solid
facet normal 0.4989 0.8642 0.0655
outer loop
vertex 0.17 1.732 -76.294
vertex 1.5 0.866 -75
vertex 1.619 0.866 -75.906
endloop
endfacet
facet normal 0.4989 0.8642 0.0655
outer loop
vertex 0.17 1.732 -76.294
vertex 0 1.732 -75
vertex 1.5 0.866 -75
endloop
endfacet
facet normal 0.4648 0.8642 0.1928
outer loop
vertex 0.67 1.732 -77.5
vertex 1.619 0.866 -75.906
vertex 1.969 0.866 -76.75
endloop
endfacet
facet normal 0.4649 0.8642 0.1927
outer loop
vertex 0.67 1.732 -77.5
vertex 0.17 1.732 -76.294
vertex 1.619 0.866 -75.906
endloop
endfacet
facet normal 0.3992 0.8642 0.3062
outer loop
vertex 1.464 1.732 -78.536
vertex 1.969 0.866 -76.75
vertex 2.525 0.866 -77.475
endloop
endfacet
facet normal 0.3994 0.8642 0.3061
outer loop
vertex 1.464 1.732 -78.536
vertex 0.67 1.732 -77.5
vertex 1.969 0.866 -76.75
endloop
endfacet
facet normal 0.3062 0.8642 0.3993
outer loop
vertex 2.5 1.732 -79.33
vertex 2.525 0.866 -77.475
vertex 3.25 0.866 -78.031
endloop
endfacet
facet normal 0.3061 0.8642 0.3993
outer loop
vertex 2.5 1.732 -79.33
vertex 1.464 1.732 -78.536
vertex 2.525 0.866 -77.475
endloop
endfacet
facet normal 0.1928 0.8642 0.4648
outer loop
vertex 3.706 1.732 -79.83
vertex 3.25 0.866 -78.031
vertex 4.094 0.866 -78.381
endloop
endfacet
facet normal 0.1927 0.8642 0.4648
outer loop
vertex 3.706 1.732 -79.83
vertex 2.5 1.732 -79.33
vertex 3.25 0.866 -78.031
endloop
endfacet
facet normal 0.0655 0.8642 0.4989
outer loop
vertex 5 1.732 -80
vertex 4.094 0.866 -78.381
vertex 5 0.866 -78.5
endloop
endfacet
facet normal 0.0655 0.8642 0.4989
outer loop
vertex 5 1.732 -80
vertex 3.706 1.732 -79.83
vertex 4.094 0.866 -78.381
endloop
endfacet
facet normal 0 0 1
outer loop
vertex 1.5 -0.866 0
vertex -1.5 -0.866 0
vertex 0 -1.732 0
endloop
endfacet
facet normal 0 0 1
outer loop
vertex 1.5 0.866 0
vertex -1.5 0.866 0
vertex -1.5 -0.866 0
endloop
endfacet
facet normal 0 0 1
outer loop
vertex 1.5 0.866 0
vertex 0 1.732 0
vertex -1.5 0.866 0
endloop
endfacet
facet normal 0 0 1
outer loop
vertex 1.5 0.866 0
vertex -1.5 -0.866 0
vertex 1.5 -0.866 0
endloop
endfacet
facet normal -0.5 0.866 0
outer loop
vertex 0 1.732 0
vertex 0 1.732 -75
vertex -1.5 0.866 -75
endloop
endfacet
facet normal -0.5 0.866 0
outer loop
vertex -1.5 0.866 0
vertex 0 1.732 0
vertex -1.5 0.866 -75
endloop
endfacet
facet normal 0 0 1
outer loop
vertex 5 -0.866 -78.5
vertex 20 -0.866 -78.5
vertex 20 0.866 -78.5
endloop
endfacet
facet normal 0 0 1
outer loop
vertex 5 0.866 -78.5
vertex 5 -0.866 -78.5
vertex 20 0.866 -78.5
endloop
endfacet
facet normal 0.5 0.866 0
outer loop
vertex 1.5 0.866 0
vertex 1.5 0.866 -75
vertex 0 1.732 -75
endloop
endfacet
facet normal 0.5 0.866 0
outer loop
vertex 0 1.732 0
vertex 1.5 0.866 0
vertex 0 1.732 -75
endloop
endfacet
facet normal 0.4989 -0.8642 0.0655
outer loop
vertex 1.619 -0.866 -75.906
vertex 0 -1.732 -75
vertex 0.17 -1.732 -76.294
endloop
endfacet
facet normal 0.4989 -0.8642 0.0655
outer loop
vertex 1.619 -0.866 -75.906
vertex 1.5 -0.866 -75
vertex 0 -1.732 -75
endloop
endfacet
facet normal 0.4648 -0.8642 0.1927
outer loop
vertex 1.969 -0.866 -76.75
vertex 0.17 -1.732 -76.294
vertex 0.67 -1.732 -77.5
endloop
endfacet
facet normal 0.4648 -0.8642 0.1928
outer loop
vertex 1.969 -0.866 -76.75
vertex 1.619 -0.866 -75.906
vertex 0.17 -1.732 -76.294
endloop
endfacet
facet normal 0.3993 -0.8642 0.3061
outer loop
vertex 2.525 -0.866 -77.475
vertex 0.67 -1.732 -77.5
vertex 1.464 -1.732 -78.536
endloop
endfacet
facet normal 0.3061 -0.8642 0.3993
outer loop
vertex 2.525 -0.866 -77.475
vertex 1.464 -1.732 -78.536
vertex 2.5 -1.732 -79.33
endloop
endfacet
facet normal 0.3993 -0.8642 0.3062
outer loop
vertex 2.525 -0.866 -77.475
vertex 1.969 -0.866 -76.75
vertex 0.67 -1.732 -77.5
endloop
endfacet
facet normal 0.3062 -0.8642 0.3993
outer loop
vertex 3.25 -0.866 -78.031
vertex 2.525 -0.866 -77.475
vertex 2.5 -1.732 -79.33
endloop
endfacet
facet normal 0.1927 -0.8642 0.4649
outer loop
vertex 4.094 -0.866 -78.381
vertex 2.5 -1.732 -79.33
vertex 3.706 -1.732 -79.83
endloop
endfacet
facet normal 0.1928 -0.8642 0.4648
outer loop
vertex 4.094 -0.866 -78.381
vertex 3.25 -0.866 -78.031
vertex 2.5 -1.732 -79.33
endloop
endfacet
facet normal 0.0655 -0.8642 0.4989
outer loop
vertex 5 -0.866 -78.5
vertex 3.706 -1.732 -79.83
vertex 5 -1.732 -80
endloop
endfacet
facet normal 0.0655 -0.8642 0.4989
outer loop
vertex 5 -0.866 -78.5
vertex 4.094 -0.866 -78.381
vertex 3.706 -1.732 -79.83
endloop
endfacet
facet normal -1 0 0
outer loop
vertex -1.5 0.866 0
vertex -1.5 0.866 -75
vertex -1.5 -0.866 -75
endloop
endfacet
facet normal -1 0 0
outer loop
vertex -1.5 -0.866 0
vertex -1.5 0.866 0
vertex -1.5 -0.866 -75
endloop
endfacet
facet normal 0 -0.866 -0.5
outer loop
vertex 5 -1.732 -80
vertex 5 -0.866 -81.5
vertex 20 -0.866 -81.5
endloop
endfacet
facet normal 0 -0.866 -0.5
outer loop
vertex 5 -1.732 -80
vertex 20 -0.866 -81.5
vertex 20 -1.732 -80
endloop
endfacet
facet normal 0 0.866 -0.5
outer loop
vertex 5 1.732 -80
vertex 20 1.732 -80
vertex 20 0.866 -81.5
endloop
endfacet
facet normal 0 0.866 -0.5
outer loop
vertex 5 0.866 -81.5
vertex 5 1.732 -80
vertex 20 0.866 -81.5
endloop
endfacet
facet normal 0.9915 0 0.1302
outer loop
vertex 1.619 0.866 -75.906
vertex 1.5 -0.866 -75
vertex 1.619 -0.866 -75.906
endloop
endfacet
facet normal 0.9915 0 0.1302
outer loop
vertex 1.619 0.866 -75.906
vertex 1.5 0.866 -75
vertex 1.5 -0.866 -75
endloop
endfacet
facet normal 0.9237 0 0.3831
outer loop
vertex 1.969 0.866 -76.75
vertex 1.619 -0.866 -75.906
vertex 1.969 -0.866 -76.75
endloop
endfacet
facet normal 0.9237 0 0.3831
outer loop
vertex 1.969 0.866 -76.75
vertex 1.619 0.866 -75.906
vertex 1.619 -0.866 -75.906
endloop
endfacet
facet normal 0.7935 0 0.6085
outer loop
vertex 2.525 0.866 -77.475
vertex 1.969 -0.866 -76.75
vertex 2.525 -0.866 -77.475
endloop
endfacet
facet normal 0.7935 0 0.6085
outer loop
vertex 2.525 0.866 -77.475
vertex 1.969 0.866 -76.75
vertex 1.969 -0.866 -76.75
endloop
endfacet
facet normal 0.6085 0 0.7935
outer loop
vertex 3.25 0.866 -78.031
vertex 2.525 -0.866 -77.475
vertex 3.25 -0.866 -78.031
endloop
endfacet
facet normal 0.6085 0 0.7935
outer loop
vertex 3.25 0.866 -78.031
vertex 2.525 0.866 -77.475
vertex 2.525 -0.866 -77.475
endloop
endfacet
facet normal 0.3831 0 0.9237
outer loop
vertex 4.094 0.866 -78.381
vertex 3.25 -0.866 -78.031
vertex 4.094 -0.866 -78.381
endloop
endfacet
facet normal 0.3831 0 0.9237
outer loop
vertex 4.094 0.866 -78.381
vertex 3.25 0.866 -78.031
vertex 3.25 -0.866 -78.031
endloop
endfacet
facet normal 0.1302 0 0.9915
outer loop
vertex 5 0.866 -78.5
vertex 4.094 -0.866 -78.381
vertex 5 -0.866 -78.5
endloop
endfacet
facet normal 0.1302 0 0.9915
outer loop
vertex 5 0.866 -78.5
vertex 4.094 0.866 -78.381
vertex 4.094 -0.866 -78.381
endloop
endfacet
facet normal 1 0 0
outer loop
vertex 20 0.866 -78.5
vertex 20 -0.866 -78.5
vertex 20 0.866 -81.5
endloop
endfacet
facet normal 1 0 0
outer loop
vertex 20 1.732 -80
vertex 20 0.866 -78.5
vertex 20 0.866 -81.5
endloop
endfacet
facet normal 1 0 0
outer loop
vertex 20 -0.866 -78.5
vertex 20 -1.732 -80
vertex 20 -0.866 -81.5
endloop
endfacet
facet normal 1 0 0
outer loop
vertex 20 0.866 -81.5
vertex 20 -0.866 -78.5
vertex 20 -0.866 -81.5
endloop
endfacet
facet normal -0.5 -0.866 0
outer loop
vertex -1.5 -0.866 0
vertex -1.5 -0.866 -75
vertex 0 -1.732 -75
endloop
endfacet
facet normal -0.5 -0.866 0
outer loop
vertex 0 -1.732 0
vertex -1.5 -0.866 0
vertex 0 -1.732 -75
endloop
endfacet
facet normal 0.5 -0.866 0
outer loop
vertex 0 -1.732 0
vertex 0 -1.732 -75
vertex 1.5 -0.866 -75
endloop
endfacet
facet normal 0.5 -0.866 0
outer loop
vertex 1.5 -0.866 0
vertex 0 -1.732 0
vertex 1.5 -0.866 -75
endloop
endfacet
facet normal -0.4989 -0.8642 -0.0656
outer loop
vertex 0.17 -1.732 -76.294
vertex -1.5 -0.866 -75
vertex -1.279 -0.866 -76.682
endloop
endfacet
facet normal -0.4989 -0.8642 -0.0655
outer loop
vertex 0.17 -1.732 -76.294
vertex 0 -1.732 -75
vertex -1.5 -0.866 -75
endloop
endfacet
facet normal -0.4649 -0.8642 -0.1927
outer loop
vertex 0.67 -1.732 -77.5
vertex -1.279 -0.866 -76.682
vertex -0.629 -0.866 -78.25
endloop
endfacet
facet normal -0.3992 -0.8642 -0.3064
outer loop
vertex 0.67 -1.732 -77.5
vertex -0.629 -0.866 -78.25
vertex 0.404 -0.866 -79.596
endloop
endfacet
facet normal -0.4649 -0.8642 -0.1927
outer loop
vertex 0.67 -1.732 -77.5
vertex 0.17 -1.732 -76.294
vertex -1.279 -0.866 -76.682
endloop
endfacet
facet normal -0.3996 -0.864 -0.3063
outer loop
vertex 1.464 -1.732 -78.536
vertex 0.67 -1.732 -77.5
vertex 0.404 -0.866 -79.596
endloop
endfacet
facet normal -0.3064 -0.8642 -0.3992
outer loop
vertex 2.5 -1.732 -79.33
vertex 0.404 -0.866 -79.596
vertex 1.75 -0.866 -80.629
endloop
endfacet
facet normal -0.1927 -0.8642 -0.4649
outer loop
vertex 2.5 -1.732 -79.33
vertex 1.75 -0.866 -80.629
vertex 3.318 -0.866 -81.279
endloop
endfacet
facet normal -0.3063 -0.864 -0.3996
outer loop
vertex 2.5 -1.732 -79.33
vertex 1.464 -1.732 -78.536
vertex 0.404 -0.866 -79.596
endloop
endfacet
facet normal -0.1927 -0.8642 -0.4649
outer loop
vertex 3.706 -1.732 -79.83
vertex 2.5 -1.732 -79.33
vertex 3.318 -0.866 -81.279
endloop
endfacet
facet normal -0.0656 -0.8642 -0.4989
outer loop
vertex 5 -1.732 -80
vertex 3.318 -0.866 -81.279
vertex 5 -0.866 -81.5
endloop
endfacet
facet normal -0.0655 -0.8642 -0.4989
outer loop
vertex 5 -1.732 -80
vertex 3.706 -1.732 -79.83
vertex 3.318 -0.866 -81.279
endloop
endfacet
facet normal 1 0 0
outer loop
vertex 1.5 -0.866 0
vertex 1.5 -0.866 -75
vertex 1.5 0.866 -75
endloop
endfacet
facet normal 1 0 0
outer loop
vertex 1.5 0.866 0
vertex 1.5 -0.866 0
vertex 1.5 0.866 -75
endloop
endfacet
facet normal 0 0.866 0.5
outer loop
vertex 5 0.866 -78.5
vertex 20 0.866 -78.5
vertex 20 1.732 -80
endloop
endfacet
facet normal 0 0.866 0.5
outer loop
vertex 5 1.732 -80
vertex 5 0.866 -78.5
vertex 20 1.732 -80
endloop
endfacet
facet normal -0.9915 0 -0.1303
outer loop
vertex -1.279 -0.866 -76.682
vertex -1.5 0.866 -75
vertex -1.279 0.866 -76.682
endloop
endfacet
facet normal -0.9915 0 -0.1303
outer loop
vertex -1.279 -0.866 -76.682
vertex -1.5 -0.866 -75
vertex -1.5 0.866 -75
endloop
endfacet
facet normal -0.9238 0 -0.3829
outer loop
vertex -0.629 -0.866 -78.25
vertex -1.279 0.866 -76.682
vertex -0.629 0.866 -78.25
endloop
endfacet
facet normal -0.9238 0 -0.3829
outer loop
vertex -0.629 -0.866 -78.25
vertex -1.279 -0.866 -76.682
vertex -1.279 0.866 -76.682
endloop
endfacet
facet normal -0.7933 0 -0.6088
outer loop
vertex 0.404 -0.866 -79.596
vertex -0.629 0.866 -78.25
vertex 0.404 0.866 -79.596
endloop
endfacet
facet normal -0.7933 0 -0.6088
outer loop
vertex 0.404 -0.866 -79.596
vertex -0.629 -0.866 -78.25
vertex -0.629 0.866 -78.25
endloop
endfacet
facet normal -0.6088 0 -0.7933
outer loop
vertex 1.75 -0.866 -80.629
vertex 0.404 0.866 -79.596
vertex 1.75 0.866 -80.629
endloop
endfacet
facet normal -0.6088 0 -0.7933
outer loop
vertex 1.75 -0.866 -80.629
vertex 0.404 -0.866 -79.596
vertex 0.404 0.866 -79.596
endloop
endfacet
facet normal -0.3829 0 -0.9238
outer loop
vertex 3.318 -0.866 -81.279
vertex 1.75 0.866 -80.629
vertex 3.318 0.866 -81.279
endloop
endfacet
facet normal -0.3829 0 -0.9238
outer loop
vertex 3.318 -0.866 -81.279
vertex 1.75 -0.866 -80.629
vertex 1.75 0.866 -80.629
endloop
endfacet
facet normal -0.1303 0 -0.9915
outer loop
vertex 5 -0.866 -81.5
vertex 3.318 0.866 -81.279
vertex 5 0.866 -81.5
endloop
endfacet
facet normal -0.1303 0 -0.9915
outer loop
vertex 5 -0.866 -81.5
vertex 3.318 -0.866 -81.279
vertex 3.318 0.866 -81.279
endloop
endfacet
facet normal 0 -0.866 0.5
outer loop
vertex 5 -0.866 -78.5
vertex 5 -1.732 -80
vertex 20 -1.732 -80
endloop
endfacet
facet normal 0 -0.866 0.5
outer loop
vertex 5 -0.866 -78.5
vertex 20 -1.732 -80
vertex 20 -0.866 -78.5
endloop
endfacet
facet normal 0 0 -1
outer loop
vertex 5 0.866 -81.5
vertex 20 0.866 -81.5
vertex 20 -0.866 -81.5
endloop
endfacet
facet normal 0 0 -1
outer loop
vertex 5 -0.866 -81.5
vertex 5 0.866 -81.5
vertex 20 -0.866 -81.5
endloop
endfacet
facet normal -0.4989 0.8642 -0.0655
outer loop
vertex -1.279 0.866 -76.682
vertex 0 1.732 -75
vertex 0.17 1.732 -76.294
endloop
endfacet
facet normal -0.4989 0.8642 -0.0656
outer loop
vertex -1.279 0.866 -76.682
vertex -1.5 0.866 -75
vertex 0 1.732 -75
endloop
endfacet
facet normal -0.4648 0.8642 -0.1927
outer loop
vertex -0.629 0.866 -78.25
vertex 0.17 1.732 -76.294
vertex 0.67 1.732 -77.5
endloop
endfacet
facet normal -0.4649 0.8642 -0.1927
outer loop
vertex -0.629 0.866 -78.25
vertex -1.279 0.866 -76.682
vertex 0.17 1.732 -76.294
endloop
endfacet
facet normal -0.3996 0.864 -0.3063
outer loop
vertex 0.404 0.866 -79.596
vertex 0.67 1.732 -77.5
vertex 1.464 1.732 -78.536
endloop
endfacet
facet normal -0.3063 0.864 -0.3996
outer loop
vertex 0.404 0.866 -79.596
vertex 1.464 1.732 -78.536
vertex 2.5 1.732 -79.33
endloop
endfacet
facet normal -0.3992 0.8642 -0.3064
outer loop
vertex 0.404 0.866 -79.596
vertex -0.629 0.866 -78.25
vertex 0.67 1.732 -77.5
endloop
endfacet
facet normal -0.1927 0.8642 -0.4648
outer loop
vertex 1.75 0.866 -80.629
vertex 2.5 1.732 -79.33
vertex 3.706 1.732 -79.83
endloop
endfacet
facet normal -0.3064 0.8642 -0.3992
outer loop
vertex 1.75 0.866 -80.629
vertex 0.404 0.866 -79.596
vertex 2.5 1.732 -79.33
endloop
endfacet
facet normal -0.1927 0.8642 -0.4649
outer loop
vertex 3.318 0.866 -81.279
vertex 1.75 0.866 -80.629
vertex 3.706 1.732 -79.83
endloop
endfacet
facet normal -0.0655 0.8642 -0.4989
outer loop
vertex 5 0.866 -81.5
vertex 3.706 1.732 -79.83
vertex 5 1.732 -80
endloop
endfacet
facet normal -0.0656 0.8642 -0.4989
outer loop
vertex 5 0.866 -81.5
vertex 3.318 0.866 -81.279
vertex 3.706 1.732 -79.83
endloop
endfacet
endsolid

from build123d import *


with BuildPart() as part:
    # Sweep1: sweep along a path in Sketch2
    with BuildLine(Plane(origin=(0, 0, 0), x_dir=(1, 0, 0), z_dir=(0, 1, 0))) as sweep1_path:
        Line((0, 0), (0, 75))
        ThreePointArc((0, 75), (1.464466094, 78.535533906), (5, 80))
        Line((5, 80), (20, 80))
    # Sketch1 → Sweep1 (sweep)
    with BuildSketch(Plane.XY):
        Polygon((-1.5, 0.866025404), (-1.5, -0.866025404), (0, -1.732050808), (1.5, -0.866025404), (1.5, 0.866025404), (0, 1.732050808), align=None)
    sweep(path=sweep1_path.line)


solid = part.part
